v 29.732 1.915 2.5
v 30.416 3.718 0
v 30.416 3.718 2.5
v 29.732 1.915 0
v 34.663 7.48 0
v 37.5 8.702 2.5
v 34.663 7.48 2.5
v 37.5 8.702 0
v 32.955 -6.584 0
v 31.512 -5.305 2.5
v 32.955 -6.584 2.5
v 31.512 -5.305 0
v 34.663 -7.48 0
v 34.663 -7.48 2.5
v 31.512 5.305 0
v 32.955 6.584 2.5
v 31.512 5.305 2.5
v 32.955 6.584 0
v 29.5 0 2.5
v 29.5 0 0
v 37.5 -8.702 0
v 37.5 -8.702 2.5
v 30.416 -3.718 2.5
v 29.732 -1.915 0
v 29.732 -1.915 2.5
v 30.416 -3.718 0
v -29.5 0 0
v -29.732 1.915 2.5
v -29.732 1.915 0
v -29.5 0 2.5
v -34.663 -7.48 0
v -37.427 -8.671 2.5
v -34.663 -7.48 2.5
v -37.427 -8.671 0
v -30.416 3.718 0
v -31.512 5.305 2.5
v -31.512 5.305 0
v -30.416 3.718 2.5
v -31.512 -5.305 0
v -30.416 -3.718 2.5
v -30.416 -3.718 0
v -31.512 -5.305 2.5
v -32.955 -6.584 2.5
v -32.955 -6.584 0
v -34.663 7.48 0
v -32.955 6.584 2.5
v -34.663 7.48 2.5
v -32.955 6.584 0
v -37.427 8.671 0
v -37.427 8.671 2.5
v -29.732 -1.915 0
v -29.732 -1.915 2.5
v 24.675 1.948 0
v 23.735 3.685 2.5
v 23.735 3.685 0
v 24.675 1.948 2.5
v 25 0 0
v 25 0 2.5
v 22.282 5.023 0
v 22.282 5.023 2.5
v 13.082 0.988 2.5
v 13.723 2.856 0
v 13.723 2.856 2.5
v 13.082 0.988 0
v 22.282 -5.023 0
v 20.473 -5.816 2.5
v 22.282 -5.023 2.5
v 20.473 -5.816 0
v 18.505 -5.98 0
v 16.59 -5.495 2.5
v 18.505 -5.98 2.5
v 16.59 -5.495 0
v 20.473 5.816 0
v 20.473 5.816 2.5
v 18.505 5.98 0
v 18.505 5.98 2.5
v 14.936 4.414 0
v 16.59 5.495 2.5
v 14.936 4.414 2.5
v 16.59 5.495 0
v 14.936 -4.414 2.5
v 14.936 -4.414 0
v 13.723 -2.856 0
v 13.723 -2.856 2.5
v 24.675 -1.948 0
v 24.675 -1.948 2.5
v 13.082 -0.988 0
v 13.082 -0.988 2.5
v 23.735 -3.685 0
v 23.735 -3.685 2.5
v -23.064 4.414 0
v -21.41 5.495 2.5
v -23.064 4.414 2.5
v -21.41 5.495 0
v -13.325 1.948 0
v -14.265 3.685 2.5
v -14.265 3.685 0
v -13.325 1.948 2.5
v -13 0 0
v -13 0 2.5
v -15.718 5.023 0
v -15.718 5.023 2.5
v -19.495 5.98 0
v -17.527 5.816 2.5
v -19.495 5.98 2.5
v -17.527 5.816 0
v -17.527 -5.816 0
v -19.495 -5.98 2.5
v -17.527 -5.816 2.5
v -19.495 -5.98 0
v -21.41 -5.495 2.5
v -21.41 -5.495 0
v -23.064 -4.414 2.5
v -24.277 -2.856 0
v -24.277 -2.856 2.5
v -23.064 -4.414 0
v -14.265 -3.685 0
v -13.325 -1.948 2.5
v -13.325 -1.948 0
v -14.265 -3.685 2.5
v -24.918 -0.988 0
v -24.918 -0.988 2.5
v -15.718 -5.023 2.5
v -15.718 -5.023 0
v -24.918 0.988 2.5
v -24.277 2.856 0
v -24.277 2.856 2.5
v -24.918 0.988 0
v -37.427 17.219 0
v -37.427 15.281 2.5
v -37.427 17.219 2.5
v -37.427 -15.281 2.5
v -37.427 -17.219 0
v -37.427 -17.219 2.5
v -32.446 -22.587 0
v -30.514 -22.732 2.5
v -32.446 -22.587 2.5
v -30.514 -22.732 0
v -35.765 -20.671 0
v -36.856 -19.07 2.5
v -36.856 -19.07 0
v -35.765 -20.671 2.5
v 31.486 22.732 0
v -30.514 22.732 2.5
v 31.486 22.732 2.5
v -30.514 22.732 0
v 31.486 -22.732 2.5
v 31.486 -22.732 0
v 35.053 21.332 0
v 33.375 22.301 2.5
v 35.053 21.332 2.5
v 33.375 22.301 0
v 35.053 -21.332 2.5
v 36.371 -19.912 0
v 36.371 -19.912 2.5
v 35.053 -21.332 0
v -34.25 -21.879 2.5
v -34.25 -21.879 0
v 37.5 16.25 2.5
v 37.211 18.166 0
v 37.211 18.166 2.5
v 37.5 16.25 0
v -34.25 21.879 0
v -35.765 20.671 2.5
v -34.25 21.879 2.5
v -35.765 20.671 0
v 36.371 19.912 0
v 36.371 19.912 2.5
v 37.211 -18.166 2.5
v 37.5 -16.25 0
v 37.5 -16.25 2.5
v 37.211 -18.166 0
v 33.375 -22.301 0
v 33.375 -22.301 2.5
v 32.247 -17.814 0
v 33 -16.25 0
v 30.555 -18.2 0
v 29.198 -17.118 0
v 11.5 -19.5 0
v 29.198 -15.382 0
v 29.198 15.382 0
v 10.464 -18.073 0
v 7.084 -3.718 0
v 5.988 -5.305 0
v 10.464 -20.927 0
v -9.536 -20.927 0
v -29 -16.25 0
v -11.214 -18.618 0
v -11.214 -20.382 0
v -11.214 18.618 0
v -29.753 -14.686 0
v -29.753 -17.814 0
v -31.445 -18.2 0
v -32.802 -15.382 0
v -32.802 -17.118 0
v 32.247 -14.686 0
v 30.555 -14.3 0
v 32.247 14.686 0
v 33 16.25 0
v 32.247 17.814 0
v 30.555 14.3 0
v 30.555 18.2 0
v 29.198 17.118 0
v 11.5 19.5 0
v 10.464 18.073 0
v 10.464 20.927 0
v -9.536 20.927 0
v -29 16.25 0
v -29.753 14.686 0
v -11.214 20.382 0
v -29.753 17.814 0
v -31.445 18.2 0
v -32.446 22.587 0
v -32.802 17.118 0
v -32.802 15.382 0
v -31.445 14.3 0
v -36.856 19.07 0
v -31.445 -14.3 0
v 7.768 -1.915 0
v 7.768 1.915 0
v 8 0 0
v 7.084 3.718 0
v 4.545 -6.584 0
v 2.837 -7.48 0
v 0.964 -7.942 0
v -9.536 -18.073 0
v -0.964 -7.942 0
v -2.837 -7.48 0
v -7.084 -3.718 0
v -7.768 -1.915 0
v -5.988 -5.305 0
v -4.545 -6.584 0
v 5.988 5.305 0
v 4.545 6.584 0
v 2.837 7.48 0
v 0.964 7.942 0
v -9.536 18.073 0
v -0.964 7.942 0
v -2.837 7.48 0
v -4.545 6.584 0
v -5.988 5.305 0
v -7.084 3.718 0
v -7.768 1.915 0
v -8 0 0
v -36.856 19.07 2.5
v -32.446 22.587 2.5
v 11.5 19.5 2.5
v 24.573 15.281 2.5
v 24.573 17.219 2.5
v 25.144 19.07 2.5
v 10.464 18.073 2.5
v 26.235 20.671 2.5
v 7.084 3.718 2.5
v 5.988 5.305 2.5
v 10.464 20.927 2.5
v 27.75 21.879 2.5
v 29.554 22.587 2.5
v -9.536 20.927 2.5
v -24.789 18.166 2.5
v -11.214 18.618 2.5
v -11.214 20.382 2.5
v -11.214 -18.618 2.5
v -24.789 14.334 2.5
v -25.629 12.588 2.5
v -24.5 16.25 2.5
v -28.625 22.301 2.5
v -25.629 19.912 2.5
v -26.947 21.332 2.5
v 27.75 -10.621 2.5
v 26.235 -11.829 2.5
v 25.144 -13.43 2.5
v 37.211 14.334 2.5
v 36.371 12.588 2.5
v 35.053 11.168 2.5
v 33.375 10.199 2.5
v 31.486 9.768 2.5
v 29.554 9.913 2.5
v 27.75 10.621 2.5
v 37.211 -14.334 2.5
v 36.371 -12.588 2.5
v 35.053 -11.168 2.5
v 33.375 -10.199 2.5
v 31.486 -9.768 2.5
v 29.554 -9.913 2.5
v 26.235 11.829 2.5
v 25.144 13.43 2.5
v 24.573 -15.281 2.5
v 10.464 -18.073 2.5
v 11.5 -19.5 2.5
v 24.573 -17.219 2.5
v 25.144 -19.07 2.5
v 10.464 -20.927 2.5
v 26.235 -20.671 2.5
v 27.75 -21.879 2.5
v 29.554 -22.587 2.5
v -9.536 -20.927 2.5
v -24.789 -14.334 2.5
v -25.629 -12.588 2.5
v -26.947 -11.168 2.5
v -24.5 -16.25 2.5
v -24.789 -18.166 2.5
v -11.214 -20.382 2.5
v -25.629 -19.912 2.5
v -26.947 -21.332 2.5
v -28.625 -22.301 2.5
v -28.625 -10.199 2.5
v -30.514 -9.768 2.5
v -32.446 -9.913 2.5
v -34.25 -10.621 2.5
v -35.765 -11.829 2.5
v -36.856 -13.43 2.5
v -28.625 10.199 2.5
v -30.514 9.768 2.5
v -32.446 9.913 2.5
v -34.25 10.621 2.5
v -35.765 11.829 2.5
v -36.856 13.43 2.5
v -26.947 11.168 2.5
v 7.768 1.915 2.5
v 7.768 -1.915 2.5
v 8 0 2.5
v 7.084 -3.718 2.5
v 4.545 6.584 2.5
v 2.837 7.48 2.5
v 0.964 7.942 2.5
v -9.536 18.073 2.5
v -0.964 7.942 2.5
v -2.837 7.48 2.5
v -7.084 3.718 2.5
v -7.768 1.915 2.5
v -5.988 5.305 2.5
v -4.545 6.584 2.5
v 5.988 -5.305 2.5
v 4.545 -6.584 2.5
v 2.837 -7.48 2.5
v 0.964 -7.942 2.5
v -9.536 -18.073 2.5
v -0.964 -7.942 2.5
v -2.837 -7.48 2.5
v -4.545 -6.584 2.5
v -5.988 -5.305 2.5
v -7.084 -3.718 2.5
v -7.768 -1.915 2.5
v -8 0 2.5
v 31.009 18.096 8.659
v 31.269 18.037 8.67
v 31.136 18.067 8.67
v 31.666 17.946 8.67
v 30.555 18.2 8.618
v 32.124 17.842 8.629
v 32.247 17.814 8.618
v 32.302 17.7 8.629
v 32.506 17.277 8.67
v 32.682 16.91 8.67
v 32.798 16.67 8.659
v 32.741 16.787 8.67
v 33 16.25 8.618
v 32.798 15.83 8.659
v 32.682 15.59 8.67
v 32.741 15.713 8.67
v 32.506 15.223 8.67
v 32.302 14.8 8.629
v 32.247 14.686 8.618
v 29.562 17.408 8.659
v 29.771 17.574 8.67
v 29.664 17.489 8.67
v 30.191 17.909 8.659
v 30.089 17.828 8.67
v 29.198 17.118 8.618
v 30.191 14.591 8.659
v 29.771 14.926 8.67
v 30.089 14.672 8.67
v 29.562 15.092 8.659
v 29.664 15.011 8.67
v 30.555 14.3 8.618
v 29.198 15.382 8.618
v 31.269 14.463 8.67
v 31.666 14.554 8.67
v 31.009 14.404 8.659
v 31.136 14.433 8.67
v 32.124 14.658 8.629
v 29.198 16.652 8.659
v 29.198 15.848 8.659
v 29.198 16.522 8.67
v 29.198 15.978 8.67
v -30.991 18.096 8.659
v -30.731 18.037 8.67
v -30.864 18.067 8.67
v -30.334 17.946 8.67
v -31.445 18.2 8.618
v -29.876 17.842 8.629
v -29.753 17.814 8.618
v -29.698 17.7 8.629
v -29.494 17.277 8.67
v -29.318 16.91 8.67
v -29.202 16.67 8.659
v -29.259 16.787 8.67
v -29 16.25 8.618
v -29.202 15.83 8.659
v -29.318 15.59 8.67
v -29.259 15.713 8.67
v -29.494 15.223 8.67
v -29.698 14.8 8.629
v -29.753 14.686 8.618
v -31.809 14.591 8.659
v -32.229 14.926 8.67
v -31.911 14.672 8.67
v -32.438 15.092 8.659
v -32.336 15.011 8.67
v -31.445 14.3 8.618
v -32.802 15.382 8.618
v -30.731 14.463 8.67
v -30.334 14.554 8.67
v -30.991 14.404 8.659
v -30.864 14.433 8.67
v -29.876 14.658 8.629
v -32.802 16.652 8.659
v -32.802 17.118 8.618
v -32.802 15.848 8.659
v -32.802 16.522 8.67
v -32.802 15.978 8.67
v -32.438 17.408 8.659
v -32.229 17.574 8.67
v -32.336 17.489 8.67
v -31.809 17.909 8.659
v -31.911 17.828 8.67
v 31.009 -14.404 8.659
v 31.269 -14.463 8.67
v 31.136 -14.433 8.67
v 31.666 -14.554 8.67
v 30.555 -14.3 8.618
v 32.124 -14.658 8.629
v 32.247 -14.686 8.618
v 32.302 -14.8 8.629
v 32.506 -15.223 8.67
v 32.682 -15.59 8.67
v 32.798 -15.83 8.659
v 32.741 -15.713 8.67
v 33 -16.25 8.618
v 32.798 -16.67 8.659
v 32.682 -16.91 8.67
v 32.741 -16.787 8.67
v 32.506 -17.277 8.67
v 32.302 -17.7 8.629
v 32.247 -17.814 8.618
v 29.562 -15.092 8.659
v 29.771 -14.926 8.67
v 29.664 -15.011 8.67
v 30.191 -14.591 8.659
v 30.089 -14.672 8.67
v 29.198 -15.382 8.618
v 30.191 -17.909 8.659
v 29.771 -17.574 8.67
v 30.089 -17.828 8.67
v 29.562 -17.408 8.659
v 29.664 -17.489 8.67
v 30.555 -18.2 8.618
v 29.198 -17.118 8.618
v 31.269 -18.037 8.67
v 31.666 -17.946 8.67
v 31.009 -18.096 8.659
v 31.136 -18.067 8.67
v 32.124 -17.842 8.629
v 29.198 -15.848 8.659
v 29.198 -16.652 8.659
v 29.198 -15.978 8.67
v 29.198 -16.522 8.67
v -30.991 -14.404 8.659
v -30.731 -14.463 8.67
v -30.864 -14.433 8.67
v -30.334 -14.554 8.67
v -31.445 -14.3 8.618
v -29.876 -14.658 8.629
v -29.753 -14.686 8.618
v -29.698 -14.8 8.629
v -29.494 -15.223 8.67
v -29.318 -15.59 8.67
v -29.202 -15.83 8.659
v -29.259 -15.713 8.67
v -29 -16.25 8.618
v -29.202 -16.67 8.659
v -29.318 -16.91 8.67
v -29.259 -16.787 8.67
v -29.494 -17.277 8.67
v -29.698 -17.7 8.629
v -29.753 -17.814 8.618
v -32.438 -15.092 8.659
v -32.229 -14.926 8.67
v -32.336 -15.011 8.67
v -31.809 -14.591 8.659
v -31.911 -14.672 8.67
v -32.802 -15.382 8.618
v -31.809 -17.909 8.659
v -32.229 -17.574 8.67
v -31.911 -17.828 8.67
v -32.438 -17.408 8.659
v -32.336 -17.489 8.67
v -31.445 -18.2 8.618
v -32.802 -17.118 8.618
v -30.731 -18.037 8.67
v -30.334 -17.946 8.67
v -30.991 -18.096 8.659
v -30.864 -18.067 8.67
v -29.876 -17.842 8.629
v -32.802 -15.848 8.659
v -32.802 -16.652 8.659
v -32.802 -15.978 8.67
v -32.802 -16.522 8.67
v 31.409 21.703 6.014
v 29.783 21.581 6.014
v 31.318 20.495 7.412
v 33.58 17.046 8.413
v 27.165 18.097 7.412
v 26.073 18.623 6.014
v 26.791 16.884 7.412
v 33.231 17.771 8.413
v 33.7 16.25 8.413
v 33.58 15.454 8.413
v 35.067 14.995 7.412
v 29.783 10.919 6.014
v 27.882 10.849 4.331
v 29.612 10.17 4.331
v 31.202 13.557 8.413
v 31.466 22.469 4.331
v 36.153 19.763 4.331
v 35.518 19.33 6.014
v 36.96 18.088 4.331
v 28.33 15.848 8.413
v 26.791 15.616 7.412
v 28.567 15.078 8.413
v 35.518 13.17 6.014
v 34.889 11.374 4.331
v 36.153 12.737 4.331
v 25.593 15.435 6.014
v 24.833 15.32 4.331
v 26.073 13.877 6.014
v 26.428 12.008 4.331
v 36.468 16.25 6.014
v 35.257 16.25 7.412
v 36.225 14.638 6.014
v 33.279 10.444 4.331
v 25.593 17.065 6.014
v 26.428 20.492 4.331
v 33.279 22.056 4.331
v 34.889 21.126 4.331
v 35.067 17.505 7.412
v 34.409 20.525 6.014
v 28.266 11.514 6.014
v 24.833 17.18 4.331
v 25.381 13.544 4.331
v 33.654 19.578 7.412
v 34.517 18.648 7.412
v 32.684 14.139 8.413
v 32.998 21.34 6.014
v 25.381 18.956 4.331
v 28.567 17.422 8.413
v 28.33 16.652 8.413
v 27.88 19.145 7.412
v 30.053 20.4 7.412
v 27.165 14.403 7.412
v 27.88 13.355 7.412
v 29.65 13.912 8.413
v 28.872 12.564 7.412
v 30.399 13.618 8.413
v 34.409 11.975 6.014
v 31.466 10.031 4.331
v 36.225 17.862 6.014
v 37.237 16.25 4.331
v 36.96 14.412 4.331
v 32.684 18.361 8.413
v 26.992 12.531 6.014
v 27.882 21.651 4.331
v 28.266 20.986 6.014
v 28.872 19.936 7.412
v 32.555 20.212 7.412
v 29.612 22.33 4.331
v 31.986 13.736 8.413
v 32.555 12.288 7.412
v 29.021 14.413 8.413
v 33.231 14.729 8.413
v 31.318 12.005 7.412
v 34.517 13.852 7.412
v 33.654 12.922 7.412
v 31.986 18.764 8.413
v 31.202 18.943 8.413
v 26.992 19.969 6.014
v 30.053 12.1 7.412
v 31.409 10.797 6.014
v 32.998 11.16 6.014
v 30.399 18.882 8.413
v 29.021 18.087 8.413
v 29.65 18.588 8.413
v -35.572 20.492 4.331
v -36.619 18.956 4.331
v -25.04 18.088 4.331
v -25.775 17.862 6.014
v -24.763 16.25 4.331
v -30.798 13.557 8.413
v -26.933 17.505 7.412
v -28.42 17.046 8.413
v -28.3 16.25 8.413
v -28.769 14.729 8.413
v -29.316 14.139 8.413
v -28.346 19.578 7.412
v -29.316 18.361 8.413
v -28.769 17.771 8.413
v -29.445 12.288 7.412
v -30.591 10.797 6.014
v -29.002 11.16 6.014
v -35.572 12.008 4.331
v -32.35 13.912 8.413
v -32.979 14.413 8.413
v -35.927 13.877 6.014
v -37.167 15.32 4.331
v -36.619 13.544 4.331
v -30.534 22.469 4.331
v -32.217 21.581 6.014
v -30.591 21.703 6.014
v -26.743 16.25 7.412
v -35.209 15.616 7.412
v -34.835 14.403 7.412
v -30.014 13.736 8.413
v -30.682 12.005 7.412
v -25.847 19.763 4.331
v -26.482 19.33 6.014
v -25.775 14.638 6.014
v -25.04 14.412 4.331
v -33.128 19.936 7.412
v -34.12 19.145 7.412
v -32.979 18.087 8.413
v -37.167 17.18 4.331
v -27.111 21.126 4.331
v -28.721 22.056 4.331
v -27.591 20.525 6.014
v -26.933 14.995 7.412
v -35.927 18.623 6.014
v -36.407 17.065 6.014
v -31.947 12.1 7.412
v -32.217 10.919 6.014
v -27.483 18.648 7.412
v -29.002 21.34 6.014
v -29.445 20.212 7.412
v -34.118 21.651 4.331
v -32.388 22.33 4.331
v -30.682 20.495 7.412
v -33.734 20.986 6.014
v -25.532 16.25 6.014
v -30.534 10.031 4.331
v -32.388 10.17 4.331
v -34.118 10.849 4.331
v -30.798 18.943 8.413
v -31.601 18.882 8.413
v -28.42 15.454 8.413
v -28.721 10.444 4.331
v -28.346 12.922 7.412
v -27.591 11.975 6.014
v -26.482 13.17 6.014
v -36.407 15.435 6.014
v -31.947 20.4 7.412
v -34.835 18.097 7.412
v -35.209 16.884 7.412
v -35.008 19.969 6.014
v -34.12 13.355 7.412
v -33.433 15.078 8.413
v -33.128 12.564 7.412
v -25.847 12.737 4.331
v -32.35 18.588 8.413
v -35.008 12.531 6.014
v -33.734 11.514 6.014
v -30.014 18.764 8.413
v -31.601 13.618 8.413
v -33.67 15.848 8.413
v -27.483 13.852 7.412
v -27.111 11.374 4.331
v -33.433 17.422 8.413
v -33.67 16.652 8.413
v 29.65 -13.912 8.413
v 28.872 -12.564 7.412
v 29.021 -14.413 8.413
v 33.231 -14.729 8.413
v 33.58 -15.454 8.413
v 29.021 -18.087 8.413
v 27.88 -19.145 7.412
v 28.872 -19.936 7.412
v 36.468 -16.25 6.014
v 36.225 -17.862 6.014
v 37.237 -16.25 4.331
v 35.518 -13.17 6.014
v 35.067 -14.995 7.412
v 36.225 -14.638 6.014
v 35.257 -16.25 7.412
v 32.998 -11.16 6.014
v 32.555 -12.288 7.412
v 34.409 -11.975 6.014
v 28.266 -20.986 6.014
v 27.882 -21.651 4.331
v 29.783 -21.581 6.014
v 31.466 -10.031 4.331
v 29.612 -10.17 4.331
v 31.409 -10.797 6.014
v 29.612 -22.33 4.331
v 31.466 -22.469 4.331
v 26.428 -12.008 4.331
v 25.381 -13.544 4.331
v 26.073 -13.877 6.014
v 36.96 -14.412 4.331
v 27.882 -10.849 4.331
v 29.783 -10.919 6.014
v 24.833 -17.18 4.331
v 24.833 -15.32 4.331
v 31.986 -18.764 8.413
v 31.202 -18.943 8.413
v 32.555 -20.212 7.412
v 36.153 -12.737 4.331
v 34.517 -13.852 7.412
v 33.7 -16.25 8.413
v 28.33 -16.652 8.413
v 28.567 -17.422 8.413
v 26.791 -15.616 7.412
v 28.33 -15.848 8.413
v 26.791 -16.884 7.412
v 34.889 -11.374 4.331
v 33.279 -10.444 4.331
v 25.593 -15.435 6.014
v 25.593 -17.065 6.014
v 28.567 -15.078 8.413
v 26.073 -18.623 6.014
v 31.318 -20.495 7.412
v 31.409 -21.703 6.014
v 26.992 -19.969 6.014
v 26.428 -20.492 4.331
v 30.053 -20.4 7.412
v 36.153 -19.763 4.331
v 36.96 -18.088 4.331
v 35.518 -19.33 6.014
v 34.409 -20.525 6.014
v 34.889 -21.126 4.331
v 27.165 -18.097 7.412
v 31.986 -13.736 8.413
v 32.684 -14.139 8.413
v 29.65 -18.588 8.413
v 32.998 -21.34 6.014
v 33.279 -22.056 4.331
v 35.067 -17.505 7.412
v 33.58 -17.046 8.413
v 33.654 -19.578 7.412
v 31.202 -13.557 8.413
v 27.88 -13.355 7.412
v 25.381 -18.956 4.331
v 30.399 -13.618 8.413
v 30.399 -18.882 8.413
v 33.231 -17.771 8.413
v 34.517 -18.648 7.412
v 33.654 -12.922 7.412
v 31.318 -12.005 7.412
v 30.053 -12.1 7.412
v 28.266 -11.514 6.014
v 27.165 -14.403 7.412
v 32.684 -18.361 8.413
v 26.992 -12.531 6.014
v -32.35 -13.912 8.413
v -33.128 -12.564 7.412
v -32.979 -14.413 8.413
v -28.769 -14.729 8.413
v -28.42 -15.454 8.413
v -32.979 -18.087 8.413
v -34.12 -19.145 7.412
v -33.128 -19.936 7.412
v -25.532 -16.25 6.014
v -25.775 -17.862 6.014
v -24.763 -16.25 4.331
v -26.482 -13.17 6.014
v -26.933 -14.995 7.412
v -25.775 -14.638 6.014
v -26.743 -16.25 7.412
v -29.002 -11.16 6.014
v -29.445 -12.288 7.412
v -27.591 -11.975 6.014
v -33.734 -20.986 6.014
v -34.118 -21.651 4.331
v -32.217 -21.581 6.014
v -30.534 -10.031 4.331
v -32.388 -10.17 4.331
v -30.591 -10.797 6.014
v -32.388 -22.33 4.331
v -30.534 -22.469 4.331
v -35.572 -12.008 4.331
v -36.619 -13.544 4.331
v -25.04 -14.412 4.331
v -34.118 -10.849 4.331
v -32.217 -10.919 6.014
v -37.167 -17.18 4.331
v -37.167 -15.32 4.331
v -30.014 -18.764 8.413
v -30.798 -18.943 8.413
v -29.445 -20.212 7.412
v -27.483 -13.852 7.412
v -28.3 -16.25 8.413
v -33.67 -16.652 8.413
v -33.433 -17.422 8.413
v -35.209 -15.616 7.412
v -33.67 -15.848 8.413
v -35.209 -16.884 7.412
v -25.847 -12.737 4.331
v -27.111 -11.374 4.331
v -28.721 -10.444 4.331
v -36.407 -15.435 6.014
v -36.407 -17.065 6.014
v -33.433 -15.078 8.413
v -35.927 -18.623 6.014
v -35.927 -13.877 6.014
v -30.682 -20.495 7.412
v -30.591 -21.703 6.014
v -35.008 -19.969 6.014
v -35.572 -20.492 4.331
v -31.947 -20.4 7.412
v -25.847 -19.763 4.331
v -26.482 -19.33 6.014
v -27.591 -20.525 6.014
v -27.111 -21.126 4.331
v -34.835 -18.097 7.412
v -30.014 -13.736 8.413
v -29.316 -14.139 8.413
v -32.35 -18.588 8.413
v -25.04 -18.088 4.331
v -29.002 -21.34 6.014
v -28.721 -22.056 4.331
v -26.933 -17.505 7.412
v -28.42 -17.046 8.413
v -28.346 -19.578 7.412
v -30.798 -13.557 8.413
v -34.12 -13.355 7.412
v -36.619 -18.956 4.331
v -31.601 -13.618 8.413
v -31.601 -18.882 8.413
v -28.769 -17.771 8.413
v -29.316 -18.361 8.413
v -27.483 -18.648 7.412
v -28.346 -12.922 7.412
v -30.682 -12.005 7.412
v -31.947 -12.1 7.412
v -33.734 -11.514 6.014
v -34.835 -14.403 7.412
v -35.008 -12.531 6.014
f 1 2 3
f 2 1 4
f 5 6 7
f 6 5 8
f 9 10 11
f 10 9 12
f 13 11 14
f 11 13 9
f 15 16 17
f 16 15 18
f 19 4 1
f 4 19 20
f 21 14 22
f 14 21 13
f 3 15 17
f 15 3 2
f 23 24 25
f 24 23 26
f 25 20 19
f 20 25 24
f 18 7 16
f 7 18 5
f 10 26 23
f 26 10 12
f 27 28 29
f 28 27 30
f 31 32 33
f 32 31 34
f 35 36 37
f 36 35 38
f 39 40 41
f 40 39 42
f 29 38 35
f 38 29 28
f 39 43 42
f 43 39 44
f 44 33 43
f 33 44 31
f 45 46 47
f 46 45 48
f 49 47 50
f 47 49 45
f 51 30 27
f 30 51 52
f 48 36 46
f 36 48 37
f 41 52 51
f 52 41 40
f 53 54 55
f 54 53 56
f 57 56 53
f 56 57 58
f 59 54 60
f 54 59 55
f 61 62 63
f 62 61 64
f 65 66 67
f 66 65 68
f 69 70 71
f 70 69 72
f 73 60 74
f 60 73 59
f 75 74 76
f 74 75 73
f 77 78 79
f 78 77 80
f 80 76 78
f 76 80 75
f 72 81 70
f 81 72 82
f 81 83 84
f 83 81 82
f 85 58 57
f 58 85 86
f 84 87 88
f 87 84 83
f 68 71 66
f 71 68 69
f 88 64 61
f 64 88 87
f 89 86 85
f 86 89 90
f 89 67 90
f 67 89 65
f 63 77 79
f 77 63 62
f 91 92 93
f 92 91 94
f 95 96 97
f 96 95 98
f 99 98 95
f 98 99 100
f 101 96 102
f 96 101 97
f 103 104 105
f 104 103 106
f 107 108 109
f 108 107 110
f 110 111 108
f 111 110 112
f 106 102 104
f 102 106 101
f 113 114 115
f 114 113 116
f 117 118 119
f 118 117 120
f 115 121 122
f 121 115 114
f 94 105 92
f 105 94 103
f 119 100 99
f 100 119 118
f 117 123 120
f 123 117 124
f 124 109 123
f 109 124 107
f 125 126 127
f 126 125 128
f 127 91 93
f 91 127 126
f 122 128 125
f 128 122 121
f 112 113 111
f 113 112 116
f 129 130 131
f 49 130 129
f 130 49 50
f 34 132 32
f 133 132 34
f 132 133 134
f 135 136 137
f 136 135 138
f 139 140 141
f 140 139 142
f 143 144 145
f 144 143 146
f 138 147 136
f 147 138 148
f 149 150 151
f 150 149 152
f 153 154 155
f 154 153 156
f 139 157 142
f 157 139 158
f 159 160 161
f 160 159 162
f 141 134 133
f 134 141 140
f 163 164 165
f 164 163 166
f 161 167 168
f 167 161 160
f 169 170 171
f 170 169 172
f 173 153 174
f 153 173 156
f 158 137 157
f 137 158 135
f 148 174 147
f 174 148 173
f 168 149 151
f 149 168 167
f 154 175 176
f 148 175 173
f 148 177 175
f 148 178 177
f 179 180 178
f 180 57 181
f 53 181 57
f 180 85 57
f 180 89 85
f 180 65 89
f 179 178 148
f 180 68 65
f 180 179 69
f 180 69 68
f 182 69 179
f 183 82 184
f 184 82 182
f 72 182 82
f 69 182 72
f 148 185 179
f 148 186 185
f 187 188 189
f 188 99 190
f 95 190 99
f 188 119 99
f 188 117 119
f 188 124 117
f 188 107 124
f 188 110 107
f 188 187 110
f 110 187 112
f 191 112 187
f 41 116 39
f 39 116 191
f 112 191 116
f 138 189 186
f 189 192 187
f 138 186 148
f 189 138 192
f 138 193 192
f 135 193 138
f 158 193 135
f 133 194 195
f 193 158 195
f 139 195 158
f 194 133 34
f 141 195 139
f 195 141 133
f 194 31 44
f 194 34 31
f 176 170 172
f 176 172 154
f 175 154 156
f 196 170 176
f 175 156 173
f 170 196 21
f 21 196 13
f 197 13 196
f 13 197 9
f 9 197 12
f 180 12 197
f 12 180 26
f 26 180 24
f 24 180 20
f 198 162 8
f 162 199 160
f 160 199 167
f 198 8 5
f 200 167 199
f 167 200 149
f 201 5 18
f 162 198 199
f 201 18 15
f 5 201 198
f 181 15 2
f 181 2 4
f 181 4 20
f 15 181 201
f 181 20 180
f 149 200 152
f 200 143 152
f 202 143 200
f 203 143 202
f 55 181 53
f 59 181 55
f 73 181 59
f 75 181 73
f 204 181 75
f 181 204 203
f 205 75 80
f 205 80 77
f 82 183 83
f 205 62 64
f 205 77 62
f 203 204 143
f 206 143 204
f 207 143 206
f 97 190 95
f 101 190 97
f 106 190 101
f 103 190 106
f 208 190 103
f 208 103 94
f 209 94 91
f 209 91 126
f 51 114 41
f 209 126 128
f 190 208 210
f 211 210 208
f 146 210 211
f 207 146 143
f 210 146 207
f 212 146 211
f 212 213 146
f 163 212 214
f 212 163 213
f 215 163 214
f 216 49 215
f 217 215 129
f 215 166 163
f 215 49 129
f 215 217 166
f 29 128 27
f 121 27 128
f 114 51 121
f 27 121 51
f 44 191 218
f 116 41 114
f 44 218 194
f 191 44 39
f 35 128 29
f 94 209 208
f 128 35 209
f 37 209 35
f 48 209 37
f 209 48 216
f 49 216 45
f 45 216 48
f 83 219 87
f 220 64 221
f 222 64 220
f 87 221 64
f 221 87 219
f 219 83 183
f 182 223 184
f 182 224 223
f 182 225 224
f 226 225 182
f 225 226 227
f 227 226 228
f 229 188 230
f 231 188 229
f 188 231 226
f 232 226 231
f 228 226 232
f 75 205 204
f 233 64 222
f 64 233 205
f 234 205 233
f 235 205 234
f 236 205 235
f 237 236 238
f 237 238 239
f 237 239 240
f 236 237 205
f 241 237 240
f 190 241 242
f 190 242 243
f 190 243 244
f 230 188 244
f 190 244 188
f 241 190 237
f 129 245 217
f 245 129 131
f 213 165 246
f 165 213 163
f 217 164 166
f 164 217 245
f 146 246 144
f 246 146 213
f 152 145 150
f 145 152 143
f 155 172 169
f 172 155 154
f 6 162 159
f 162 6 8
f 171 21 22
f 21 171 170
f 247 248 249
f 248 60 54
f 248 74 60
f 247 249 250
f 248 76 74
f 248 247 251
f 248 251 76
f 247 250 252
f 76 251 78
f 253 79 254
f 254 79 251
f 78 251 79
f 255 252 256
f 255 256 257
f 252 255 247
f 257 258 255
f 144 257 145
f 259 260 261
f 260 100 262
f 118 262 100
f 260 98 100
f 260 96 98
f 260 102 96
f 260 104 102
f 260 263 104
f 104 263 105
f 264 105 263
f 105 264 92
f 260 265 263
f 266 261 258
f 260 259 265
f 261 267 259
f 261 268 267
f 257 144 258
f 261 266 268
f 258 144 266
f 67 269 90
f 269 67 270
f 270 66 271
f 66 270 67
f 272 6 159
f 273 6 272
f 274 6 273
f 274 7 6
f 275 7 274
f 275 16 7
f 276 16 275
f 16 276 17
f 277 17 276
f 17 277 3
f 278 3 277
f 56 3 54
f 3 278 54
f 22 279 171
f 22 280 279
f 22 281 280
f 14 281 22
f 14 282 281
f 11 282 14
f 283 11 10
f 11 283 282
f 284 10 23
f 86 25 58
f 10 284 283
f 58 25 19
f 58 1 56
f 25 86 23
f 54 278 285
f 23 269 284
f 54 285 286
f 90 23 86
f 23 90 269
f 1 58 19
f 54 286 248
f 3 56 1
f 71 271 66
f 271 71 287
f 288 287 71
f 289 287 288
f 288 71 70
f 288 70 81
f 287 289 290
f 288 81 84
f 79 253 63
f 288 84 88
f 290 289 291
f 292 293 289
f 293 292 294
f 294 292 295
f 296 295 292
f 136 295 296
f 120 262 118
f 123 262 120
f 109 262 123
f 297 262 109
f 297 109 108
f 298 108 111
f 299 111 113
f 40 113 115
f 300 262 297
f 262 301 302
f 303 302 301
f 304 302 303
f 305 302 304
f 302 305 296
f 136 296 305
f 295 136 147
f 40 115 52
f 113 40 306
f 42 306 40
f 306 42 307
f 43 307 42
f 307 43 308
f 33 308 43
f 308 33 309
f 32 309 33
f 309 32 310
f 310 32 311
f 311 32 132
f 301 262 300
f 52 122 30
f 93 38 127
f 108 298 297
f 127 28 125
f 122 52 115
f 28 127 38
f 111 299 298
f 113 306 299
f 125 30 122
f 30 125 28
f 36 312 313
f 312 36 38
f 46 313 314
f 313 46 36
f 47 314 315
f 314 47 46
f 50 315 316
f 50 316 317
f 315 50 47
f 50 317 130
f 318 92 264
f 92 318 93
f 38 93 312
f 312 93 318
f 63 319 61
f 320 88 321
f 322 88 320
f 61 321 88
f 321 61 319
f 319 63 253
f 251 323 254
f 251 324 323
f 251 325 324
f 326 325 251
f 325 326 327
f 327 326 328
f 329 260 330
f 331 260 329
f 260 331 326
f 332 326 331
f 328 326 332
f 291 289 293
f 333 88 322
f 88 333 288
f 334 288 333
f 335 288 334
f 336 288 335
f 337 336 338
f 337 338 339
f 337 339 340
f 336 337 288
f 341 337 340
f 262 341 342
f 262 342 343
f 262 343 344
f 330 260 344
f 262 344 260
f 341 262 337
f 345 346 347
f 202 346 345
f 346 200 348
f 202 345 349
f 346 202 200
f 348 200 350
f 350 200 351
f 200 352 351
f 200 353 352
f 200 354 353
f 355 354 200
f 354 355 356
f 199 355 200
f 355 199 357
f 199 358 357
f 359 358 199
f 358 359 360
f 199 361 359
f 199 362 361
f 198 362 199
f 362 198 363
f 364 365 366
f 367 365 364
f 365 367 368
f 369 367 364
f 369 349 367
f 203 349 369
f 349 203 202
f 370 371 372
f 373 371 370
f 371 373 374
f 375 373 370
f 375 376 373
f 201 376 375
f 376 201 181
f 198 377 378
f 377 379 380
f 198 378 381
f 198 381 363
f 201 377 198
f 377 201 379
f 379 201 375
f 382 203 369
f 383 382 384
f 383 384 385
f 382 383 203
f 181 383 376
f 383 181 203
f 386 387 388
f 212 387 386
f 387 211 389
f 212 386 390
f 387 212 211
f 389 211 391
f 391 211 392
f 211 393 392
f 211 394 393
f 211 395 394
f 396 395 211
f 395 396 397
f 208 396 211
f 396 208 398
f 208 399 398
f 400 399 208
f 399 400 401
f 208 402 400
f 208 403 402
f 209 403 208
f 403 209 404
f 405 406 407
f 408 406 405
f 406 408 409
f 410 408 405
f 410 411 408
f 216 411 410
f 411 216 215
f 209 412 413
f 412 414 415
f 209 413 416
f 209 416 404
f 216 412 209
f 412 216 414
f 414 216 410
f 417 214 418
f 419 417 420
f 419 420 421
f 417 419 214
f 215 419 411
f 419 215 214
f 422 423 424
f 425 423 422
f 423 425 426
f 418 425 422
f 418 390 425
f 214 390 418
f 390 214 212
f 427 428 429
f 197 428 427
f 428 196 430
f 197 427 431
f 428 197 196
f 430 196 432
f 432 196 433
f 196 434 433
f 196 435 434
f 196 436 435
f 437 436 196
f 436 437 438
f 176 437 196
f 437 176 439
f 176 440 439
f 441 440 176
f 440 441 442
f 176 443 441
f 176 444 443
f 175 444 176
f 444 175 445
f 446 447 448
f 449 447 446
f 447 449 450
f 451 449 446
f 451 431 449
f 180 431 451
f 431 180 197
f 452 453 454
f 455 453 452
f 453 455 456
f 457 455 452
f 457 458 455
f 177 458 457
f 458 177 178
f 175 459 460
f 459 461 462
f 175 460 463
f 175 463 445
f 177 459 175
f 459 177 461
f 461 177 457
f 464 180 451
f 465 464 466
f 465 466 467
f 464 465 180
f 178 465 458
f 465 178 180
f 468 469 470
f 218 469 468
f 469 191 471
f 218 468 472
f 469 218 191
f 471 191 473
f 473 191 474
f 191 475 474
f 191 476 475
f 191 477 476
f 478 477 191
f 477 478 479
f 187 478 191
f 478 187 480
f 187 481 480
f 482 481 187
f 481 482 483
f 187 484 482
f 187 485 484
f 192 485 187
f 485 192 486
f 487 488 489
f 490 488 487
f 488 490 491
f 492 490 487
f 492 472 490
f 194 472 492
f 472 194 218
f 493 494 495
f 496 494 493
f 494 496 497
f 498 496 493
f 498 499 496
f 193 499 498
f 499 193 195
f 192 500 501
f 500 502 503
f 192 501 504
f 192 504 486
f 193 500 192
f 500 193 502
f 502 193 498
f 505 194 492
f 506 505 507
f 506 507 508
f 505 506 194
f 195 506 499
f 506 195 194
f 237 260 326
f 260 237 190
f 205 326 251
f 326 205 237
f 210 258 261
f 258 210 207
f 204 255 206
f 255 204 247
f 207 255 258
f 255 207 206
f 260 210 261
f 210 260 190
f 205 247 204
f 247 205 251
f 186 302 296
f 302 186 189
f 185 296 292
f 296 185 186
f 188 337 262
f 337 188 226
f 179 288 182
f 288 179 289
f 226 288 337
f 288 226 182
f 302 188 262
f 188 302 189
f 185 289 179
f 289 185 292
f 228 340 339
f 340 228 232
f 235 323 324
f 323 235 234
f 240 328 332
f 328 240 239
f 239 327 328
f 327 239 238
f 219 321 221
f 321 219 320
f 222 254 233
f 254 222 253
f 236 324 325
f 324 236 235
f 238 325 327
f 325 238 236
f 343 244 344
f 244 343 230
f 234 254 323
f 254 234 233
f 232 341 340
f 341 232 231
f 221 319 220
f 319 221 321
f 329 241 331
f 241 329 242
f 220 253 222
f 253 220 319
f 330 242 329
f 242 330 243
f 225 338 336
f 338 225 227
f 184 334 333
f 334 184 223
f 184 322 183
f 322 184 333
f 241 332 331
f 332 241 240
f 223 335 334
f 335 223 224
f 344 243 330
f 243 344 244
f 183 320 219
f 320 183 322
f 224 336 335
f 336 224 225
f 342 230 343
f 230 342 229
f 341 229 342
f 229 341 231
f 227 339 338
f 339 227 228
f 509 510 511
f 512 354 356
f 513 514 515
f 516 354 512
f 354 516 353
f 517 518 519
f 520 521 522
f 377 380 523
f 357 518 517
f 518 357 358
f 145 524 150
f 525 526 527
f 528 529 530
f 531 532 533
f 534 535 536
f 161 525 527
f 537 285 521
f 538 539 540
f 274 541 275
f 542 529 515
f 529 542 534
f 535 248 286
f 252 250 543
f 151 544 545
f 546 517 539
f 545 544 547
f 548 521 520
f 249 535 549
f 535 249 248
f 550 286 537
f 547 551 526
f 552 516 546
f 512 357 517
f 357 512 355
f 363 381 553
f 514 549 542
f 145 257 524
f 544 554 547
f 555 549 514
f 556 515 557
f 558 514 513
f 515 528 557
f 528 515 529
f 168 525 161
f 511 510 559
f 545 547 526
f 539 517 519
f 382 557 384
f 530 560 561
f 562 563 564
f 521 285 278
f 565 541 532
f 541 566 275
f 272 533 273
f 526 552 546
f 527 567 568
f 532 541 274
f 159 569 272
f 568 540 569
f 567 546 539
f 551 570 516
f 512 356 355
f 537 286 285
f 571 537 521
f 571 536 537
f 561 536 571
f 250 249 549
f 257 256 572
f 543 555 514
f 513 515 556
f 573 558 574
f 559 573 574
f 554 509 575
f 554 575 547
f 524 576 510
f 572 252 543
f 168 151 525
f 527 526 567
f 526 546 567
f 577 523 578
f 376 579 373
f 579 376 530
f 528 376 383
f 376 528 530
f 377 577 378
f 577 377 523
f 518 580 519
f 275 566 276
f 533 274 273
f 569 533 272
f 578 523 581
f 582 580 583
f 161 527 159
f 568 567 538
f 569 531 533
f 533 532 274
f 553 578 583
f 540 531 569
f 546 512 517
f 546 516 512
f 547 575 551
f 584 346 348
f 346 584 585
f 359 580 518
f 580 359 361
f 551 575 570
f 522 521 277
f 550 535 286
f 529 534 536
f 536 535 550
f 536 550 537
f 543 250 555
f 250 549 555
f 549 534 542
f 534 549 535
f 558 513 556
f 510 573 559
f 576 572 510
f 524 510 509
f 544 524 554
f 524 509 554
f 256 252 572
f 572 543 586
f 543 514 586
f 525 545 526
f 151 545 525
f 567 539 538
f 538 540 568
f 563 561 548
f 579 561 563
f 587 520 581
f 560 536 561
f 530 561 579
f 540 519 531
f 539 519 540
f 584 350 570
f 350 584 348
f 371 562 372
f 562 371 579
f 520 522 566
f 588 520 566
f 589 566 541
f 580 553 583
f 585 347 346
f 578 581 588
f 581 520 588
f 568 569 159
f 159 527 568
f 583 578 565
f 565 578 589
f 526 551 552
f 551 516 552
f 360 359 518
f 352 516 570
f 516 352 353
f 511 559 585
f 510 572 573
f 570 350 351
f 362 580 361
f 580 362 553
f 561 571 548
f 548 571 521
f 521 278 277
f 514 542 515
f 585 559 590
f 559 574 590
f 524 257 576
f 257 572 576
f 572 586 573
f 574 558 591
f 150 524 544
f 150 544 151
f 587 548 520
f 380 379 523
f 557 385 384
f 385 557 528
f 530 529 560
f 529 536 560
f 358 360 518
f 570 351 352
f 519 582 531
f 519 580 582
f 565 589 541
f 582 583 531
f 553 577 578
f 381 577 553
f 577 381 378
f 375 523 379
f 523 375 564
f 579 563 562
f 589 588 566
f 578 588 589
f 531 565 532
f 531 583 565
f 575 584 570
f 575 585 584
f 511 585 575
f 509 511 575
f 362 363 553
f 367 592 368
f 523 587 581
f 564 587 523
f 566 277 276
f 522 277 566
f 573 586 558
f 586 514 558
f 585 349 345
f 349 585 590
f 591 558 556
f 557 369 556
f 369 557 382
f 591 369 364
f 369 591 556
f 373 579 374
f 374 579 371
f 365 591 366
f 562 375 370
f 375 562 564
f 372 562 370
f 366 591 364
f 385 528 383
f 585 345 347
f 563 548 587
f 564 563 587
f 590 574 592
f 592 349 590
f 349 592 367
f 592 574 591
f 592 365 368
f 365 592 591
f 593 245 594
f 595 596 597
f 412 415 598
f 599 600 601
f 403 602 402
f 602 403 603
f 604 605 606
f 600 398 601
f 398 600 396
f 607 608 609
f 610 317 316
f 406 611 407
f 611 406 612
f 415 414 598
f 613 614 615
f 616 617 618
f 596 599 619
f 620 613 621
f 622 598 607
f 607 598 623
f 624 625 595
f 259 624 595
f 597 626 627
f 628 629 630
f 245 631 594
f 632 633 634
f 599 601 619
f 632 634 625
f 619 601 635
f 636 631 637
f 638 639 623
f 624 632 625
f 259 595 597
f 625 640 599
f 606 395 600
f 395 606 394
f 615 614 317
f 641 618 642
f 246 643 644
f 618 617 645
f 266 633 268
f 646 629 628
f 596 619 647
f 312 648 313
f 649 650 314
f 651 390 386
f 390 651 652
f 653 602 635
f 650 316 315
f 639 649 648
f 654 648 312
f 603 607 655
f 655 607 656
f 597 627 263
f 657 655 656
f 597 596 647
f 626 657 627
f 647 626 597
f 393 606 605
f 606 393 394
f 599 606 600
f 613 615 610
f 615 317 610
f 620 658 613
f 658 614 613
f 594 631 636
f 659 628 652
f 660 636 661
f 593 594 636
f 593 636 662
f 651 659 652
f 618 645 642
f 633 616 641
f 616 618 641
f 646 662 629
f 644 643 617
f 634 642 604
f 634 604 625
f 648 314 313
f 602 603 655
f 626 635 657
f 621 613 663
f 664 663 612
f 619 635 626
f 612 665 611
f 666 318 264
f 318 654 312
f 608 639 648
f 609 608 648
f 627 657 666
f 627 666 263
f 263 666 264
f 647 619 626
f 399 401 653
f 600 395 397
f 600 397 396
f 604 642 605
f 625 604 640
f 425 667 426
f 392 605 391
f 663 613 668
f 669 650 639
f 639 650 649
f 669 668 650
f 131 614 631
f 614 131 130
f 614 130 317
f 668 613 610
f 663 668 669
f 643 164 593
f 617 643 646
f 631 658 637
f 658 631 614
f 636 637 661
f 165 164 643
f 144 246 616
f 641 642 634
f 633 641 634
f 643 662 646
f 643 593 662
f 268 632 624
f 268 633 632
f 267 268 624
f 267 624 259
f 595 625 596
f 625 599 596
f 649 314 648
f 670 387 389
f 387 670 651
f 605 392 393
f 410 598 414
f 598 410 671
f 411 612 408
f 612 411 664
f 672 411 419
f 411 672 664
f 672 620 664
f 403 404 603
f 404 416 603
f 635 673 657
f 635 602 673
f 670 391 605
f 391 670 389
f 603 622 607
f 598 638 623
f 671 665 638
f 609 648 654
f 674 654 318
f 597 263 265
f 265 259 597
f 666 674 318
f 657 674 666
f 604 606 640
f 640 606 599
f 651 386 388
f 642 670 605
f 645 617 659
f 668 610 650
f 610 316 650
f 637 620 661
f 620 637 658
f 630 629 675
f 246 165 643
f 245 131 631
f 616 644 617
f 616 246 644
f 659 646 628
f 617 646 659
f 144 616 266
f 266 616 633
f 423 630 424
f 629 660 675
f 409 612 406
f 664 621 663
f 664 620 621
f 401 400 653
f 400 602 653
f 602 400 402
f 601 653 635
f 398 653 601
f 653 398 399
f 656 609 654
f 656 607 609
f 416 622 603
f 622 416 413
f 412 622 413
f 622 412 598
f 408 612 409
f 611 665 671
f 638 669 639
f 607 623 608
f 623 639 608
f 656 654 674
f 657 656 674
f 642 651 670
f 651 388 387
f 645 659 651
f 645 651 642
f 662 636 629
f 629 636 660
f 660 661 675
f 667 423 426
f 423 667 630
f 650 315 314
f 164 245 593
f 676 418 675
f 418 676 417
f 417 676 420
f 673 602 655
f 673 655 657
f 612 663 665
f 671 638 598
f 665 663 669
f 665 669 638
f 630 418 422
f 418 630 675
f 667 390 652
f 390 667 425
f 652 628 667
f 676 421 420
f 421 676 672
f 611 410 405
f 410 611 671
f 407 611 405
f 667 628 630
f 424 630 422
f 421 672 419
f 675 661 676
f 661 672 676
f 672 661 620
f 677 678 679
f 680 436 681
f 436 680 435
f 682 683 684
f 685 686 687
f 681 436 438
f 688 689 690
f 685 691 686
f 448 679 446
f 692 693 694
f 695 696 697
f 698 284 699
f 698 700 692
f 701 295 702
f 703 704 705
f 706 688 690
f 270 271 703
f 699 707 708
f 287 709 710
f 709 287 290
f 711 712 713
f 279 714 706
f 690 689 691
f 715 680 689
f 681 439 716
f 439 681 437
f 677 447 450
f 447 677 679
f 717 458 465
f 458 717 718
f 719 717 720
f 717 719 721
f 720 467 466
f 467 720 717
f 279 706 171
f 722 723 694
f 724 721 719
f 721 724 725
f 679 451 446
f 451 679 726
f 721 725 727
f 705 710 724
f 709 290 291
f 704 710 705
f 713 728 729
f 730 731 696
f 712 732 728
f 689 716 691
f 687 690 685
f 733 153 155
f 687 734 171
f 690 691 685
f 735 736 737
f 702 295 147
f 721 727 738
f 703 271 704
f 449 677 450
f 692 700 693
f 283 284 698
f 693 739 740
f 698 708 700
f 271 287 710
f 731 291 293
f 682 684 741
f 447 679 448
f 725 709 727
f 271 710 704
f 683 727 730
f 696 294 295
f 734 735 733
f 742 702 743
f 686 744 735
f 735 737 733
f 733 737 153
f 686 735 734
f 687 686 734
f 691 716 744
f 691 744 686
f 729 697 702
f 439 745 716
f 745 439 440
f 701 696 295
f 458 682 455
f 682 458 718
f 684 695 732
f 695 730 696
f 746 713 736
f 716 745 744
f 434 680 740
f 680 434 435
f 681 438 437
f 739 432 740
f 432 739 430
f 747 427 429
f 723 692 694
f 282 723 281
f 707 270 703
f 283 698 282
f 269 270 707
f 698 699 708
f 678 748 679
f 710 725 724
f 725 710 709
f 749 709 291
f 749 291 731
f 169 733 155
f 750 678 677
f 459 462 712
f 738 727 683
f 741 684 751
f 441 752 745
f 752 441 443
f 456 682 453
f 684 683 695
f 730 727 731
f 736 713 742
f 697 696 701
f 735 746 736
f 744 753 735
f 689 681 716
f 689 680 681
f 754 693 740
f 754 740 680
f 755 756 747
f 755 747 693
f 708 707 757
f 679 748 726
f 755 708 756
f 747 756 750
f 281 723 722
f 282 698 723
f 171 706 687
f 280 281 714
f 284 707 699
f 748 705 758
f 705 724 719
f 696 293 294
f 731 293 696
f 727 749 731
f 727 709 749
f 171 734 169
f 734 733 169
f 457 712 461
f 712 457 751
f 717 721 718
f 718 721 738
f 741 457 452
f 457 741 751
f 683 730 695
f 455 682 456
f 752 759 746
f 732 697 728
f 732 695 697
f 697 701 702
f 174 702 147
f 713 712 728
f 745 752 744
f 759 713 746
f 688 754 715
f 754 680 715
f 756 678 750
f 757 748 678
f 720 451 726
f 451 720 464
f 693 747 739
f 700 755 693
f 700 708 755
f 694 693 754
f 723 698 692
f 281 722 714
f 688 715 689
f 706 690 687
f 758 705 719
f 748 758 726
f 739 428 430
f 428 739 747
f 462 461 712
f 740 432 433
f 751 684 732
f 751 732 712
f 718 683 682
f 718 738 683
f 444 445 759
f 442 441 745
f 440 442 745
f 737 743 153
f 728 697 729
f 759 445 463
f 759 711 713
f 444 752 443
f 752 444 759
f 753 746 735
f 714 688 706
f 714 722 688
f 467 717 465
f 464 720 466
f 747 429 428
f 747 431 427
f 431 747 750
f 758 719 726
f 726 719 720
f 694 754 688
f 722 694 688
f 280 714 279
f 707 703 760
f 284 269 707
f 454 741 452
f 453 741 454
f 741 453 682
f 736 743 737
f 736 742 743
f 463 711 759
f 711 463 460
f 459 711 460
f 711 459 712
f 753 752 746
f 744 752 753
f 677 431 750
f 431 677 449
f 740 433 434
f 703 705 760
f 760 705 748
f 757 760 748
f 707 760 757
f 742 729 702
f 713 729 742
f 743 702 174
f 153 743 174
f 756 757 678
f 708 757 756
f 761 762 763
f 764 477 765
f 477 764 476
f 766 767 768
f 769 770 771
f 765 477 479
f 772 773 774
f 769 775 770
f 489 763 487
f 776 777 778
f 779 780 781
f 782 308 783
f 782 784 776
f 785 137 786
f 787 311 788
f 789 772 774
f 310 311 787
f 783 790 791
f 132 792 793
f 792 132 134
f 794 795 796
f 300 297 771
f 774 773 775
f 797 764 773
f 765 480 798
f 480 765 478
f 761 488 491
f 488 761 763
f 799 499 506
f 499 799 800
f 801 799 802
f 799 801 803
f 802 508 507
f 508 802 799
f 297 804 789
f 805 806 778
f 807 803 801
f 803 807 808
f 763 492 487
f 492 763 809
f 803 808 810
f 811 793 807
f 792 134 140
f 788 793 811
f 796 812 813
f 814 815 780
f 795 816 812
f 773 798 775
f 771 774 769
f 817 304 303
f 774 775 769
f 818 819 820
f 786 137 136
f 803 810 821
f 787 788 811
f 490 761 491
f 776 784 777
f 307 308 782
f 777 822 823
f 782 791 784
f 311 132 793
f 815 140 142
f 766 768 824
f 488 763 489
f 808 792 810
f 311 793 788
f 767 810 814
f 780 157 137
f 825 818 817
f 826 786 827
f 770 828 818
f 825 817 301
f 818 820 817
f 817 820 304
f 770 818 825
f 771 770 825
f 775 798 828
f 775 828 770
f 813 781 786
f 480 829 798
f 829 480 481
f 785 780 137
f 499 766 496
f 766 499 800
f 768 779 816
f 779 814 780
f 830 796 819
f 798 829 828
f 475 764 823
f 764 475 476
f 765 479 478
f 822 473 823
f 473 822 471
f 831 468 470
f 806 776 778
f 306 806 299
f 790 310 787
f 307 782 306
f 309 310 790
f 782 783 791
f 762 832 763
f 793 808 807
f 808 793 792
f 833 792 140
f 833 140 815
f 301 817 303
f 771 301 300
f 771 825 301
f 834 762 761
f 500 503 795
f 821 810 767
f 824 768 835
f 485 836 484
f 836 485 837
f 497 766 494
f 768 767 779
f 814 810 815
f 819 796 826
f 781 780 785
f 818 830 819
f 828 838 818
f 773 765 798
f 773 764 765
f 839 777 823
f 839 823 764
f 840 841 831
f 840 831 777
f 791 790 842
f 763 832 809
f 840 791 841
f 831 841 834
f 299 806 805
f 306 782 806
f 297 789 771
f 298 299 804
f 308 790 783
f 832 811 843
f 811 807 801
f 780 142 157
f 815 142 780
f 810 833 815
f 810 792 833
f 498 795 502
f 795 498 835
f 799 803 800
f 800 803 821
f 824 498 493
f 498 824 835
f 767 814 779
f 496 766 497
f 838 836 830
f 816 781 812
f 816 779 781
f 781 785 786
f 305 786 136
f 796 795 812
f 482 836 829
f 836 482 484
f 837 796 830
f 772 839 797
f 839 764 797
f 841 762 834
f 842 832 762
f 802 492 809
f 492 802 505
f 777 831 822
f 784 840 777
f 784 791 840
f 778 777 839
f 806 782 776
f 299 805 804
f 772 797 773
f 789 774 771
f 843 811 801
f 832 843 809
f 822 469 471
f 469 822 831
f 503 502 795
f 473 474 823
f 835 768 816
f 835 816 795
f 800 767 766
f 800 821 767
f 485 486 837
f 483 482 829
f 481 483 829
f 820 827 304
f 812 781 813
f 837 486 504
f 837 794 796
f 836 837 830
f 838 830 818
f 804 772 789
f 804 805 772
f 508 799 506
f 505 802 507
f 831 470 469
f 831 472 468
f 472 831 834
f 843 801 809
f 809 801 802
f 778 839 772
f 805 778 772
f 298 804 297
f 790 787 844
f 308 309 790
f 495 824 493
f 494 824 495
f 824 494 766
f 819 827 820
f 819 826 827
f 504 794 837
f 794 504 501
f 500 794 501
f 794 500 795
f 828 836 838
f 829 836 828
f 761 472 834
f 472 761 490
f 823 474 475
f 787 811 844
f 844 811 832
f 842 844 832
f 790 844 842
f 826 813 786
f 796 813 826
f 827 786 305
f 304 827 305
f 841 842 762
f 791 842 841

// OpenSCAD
//#import("lipo-protector.stl");

//size of battery
width=35;
length=75;


//base plate
difference(){
hull(){
translate([(length/2)-6.5,width/2-1.25,0])  cylinder(2.5,6.5,6.5);
translate([(-length/2)+6.5,width/2-1.25,0]) cylinder(2.5,6.5,6.5);
translate([(length/2)-6.5,-width/2+1.25,0]) cylinder(2.5,6.5,6.5);
translate([(-length/2)+6.5,-width/2+1.25,0]) cylinder(2.5,6.5,6.5); 
}
//grub holes
translate([(length/2)-6.5,width/2-1.25,-10]) cylinder(20,2,2);  
translate([(-length/2)+6.5,width/2-1.25,-10]) cylinder(20,2,2); 
translate([(length/2)-6.5,-width/2+1.25,-10]) cylinder(20,2,2);
translate([(-length/2)+6.5,-width/2+1.25,-10]) cylinder(20,2,2);

//strap holes
hull(){
translate([10,width/2+2,-0.1]) cylinder(10,1.5,1.5);
translate([-10,width/2+2,-0.1]) cylinder(10,1.5,1.5);
}
hull(){
translate([10,-width/2-2,-0.1]) cylinder(10,1.5,1.5);
translate([-10,-width/2-2,-0.1]) cylinder(10,1.5,1.5);
}



//outer cuts - /weight saving
if (length >=80){
    hull(){
    translate([(((10/2)+2 + length/2)-6.5)/2,-width/2-4,-0.1]) cylinder(10,6,6);
    translate([(((10/2)+2 + length/2)-6.5)/2,-width/2-10,-0.1]) cylinder(10,9,9);
    }
    hull(){
    translate([(((10/2)+2 + length/2)-6.5)/2,width/2+4,-0.1]) cylinder(10,6,6);
    translate([(((10/2)+2 + length/2)-6.5)/2,width/2+10,-0.1]) cylinder(10,9,9);
    }
    hull(){
    translate([-(((10/2)+2 + length/2)-6.5)/2,-width/2-4,-0.1]) cylinder(10,6,6);
    translate([-(((10/2)+2 + length/2)-6.5)/2,-width/2-10,-0.1]) cylinder(10,9,9);
    }
    hull(){
    translate([-(((10/2)+2 + length/2)-6.5)/2,width/2+4,-0.1]) cylinder(10,6,6);
    translate([-(((10/2)+2 + length/2)-6.5)/2,width/2+10,-0.1]) cylinder(10,9,9);
    }
}

if (width >=30){
hull(){
translate([length/2,0,-0.1]) cylinder(10,8,8);
translate([length/2+10,0,-0.1]) cylinder(10,12,12);
}
hull(){
translate([-length/2,0,-0.1]) cylinder(10,8,8);
translate([-length/2-10,0,-0.1]) cylinder(10,12,12);
}
}

//inner cuts - weight saving
if (width >=30 && length >=65){
translate([(((10/2)+2 + length/2)-6.5)/2,0,-0.1]) cylinder(10,6,6);
translate([-(((10/2)+2 + length/2)-6.5)/2,0,-0.1]) cylinder(10,6,6);
}

if (width >=30 && length >=50){
translate([0,0,-0.1]) cylinder(10,8,8);
} else {
translate([0,0,-0.1]) cylinder(10,6,6);    
}    

}






//grubs & holes
difference(){
translate([(length/2)-6.5,width/2-1.25,2.5]) sphere(6.5);
translate([(length/2)-6.5,width/2-1.25,-10]) cylinder(10,6.5,6.5);
translate([(length/2)-6.5,width/2-1.25,-10]) cylinder(20,2,2);    
}
difference(){
translate([(-length/2)+6.5,width/2-1.25,2.5]) sphere(6.5);
translate([(-length/2)+6.5,width/2-1.25,-10]) cylinder(10,6.5,6.5);
translate([(-length/2)+6.5,width/2-1.25,-10]) cylinder(20,2,2);   
} 
difference(){
translate([(length/2)-6.5,-width/2+1.25,2.5]) sphere(6.5);
translate([(length/2)-6.5,-width/2+1.25,-10]) cylinder(10,6.5,6.5);
translate([(length/2)-6.5,-width/2+1.25,-10]) cylinder(20,2,2); 
}
difference(){
translate([(-length/2)+6.5,-width/2+1.25,2.5]) sphere(6.5);
translate([(-length/2)+6.5,-width/2+1.25,-10]) cylinder(10,6.5,6.5);   
translate([(-length/2)+6.5,-width/2+1.25,-10]) cylinder(20,2,2); 
}    
